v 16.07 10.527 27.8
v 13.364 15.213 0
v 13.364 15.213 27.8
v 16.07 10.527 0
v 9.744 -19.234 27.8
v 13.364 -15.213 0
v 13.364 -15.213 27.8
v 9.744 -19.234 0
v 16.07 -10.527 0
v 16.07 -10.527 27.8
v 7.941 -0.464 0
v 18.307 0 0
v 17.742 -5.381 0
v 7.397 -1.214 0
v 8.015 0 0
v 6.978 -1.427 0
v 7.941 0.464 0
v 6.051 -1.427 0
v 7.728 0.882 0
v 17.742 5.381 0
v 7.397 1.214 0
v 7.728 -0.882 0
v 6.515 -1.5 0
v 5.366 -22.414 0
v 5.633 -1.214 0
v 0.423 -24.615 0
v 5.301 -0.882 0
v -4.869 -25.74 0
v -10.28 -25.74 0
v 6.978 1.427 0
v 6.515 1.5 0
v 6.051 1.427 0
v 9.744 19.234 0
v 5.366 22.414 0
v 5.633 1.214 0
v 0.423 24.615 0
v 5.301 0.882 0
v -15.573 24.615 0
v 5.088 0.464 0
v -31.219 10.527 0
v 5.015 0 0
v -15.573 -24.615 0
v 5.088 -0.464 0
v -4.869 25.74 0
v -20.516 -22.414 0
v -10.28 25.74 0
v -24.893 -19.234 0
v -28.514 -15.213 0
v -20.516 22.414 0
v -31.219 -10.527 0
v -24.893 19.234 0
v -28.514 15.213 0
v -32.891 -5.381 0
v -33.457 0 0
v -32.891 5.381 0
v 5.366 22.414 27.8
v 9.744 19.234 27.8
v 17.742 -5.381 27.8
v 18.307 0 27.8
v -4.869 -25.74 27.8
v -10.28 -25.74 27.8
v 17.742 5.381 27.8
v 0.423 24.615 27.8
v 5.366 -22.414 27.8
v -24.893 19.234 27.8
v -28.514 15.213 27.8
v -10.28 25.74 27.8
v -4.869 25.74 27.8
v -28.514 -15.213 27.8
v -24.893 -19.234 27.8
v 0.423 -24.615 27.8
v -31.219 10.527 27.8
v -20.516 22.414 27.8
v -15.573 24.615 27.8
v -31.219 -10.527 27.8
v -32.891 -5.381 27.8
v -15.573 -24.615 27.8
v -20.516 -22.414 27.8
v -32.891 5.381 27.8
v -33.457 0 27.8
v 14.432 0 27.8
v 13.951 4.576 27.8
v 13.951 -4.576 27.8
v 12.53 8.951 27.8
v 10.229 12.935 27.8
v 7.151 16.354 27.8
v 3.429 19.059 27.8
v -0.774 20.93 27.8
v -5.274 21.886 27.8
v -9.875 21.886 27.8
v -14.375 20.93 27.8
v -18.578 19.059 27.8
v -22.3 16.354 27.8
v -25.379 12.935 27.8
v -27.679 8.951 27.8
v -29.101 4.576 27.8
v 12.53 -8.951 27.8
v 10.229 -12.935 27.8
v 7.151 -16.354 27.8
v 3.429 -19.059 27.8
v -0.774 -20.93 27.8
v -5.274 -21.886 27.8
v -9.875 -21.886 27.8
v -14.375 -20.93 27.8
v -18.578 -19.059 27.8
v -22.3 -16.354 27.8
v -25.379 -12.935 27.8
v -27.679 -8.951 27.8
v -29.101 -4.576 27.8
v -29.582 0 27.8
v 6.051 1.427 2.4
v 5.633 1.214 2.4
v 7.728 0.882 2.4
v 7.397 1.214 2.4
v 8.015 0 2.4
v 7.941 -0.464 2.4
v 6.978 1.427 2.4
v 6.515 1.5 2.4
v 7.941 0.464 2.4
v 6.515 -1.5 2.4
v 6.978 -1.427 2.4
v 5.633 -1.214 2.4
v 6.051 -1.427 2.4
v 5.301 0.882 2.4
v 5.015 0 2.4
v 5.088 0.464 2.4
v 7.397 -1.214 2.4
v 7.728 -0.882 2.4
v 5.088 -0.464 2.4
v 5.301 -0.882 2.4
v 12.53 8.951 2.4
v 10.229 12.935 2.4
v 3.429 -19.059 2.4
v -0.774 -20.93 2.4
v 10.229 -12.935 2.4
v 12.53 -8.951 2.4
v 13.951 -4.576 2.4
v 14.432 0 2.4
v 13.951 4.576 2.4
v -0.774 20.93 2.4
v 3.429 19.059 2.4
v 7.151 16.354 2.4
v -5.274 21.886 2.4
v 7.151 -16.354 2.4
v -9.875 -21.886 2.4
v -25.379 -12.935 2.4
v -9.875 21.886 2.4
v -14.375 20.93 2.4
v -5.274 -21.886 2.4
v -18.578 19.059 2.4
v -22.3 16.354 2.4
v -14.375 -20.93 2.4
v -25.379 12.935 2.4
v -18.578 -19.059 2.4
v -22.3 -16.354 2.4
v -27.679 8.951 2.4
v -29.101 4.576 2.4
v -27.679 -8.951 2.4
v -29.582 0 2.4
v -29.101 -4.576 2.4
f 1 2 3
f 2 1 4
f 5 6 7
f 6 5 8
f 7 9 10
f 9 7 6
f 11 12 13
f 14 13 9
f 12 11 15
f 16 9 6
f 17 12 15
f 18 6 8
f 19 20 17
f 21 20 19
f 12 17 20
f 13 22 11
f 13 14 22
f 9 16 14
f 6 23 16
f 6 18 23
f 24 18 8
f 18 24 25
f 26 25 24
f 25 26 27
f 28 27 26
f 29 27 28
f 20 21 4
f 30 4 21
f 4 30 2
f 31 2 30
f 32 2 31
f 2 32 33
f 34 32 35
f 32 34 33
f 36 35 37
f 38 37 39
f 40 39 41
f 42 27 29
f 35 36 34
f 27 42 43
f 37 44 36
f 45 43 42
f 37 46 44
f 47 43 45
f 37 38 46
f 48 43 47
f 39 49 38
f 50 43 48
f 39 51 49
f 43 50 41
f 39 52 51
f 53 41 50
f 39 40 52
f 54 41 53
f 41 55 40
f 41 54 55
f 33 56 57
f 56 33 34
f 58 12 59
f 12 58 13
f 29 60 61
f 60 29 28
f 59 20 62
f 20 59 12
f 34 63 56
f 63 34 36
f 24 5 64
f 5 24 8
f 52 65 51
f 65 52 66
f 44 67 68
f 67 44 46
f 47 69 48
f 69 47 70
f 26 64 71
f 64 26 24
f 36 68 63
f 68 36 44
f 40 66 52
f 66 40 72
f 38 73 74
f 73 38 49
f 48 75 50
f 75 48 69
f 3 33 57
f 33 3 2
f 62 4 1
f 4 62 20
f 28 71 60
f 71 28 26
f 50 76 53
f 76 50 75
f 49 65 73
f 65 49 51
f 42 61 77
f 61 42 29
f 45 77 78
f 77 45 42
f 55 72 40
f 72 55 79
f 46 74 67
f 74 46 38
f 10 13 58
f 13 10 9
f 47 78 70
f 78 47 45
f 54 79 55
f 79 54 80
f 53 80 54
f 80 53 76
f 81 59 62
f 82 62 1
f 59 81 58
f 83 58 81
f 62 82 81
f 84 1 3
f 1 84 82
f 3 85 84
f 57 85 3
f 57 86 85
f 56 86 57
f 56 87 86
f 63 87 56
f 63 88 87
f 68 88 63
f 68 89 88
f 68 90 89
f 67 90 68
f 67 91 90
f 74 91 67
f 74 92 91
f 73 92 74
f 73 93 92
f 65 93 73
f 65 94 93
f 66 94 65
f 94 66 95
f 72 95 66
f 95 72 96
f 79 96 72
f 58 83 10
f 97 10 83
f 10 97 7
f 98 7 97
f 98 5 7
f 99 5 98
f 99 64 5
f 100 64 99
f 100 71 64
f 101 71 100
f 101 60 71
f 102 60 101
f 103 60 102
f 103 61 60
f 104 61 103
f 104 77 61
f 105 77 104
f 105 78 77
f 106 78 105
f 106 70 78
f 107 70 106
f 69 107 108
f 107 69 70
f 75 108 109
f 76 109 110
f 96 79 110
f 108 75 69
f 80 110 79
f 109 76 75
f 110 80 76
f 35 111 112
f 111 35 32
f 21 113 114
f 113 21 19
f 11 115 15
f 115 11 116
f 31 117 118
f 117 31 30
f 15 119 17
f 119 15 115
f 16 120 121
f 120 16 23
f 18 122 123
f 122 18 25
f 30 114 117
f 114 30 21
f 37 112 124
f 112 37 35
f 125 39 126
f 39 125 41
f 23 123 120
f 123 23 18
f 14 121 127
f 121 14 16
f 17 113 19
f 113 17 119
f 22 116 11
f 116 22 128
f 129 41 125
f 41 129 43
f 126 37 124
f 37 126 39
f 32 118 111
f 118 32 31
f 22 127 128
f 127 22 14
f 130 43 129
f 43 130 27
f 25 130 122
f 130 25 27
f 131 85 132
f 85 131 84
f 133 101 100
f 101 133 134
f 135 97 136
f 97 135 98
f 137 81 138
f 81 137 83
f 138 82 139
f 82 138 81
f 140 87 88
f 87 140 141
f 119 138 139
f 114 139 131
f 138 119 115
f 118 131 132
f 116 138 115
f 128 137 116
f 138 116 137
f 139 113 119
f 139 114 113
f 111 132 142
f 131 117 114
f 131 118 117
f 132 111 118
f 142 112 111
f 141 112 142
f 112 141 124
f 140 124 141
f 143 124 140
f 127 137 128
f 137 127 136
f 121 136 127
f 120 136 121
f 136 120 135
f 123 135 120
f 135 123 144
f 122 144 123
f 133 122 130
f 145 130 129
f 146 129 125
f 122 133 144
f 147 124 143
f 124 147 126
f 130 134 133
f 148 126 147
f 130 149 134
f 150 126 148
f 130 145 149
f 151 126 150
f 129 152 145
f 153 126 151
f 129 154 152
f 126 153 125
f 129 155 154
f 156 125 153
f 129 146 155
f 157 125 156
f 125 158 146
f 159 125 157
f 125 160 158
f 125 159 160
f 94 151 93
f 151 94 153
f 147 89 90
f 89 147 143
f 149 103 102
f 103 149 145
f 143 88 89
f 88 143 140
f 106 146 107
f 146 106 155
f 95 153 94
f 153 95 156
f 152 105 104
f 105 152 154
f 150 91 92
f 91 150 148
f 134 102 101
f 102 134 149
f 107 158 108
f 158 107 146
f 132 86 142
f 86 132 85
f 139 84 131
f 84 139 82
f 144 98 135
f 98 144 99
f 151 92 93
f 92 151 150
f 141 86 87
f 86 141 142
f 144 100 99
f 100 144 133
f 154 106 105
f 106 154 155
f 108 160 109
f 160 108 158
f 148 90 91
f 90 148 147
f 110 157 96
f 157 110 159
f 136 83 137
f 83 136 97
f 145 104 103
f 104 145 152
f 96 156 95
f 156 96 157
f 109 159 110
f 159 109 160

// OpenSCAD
// file: common.scad
// units are in mm in keeping with OpenSCAD STL export behavior
// multiplying a dimension in inches by the `inch` variable
// produces the equivalent dimension in mm
inch = 25.4;

thick = 0.6; // 3D printer layer height / line thickness. This should not be changed.

// ABS pipe standard dimensions for nominal 1.25 inch pipe
// diameters
pipe_OD = 1.660 * inch;
pipe_ID = 1.385 * inch;
// radii
pipe_OR = pipe_OD/2;
pipe_IR = pipe_ID/2;

// PCB dimensions and mounting hole spacing
PCBX = 6.400 * inch;
PCBY = 1.250 * inch;
PCBZ = 1.6; // thickness, confirm with PCB fab service
mount_hole_spacing = 0.500 * inch;
mount_hole_start = 0.250 * inch;

// to facilitate 3D printing the skeleton for a single T-Stick
// is broken into several parts, which I here refer to as "modules"
skeleton_module_length = 6 * inch;
skeleton_face_thickness = 3 * thick; // 1.8mm
connector_thickness = 3 * thick; // 1.8mm
connector_width = 15;
connector_length = skeleton_module_length*2/3;
// right angle triangle with base PCBY/2 and hypotenuse pipe_IR has height...
cylinder_top_cut_height_offset = sqrt(pipe_IR*pipe_IR - (PCBY/2)*(PCBY/2));
skeleton_module_total_thickness = pipe_IR - cylinder_top_cut_height_offset;

// hardware
// these should probably be oversized or parameterized
// to allow press fit vs loose fit
M3_hole_diameter = 3;
M3_hole_diameter_loose = 3.3;
M3_nut_height = 2.4;
M3_head_diameter = 7;
M3_head_height = 3;
M3_nut_circumcircle_diameter = 6;
heatshrink_thickness = 5/8;

module M3_nut_volume(rotation=0, scaling=1)
{
    scale([scaling, scaling, scaling]) rotate([0,0,rotation])
        cylinder(h = M3_nut_height, d = M3_nut_circumcircle_diameter, $fn=6);
}

module pipe_volume(radius, length=skeleton_module_length)
{
    translate([0,0,cylinder_top_cut_height_offset])
            rotate([0,90,0])
                cylinder(h = length, r = radius);
}

module pipe_ID_volume(length=skeleton_module_length)
{
    pipe_volume(pipe_IR, length);
}

module pipe_OD_volume(length=skeleton_module_length)
{
    pipe_volume(pipe_OR, length);
}

module pipe_top_area()
{
    translate([-500,-500,0])
        cube([1000,1000,1000]);
}

module skeleton_module_volume(length=skeleton_module_length)
{
    skeleton_fit_shrink = 0.4; // so that the skeleton fits flush inside the pipe
    difference()
    {
        pipe_volume(pipe_IR-skeleton_fit_shrink, length);
        pipe_top_area();
    }
}

module screw_holes(diameter=M3_hole_diameter)
{
    union()
    {
        for(x = [mount_hole_start : mount_hole_spacing : skeleton_module_length - 1])
        {
            translate([x, 0, -500])
                cylinder(h = 1000, d = diameter, $fn=20);
        }
    }
}

axial_screw_hole_offset = cylinder_top_cut_height_offset-pipe_ID/2+M3_head_diameter/2;
module axial_screw_hole(diameter=M3_hole_diameter, length=1000, center=true, xoffset=0)
{
    translate([xoffset,0,axial_screw_hole_offset])
        rotate([0,90,0])
            cylinder(length, r=diameter/2, $fn=20, center=center);
}

module top_axial()
{
    translate([0,0,cylinder_top_cut_height_offset])
        rotate([180,0,0])
            translate([0,0,-cylinder_top_cut_height_offset])
                children();
}
// file: endcap.scad
include <common.scad>

endcap_min_wall = 4*thick;
endcap_IR_fit_tolerance = 0.3;
endcap_OR = pipe_OR + 8*thick;
endcap_IR = pipe_OR + heatshrink_thickness + endcap_IR_fit_tolerance;

module endcap_volume()
{
    translate([-endcap_min_wall,0,0]) intersection()
    {
        pipe_volume(endcap_OR);
        translate([0, -500, -500]) cube([inch + endcap_min_wall, 1000, 1000]);
    }
}

module endcap_cavity()
{
    pipe_volume(endcap_IR);
}

module plain_endcap()
{
    difference()
    {
        endcap_volume();
        axial_screw_hole();
        endcap_cavity();
    }
}
// main file
include <endcap.scad>

translate([0,0,endcap_min_wall]) rotate([0,-90,0]) plain_endcap();
